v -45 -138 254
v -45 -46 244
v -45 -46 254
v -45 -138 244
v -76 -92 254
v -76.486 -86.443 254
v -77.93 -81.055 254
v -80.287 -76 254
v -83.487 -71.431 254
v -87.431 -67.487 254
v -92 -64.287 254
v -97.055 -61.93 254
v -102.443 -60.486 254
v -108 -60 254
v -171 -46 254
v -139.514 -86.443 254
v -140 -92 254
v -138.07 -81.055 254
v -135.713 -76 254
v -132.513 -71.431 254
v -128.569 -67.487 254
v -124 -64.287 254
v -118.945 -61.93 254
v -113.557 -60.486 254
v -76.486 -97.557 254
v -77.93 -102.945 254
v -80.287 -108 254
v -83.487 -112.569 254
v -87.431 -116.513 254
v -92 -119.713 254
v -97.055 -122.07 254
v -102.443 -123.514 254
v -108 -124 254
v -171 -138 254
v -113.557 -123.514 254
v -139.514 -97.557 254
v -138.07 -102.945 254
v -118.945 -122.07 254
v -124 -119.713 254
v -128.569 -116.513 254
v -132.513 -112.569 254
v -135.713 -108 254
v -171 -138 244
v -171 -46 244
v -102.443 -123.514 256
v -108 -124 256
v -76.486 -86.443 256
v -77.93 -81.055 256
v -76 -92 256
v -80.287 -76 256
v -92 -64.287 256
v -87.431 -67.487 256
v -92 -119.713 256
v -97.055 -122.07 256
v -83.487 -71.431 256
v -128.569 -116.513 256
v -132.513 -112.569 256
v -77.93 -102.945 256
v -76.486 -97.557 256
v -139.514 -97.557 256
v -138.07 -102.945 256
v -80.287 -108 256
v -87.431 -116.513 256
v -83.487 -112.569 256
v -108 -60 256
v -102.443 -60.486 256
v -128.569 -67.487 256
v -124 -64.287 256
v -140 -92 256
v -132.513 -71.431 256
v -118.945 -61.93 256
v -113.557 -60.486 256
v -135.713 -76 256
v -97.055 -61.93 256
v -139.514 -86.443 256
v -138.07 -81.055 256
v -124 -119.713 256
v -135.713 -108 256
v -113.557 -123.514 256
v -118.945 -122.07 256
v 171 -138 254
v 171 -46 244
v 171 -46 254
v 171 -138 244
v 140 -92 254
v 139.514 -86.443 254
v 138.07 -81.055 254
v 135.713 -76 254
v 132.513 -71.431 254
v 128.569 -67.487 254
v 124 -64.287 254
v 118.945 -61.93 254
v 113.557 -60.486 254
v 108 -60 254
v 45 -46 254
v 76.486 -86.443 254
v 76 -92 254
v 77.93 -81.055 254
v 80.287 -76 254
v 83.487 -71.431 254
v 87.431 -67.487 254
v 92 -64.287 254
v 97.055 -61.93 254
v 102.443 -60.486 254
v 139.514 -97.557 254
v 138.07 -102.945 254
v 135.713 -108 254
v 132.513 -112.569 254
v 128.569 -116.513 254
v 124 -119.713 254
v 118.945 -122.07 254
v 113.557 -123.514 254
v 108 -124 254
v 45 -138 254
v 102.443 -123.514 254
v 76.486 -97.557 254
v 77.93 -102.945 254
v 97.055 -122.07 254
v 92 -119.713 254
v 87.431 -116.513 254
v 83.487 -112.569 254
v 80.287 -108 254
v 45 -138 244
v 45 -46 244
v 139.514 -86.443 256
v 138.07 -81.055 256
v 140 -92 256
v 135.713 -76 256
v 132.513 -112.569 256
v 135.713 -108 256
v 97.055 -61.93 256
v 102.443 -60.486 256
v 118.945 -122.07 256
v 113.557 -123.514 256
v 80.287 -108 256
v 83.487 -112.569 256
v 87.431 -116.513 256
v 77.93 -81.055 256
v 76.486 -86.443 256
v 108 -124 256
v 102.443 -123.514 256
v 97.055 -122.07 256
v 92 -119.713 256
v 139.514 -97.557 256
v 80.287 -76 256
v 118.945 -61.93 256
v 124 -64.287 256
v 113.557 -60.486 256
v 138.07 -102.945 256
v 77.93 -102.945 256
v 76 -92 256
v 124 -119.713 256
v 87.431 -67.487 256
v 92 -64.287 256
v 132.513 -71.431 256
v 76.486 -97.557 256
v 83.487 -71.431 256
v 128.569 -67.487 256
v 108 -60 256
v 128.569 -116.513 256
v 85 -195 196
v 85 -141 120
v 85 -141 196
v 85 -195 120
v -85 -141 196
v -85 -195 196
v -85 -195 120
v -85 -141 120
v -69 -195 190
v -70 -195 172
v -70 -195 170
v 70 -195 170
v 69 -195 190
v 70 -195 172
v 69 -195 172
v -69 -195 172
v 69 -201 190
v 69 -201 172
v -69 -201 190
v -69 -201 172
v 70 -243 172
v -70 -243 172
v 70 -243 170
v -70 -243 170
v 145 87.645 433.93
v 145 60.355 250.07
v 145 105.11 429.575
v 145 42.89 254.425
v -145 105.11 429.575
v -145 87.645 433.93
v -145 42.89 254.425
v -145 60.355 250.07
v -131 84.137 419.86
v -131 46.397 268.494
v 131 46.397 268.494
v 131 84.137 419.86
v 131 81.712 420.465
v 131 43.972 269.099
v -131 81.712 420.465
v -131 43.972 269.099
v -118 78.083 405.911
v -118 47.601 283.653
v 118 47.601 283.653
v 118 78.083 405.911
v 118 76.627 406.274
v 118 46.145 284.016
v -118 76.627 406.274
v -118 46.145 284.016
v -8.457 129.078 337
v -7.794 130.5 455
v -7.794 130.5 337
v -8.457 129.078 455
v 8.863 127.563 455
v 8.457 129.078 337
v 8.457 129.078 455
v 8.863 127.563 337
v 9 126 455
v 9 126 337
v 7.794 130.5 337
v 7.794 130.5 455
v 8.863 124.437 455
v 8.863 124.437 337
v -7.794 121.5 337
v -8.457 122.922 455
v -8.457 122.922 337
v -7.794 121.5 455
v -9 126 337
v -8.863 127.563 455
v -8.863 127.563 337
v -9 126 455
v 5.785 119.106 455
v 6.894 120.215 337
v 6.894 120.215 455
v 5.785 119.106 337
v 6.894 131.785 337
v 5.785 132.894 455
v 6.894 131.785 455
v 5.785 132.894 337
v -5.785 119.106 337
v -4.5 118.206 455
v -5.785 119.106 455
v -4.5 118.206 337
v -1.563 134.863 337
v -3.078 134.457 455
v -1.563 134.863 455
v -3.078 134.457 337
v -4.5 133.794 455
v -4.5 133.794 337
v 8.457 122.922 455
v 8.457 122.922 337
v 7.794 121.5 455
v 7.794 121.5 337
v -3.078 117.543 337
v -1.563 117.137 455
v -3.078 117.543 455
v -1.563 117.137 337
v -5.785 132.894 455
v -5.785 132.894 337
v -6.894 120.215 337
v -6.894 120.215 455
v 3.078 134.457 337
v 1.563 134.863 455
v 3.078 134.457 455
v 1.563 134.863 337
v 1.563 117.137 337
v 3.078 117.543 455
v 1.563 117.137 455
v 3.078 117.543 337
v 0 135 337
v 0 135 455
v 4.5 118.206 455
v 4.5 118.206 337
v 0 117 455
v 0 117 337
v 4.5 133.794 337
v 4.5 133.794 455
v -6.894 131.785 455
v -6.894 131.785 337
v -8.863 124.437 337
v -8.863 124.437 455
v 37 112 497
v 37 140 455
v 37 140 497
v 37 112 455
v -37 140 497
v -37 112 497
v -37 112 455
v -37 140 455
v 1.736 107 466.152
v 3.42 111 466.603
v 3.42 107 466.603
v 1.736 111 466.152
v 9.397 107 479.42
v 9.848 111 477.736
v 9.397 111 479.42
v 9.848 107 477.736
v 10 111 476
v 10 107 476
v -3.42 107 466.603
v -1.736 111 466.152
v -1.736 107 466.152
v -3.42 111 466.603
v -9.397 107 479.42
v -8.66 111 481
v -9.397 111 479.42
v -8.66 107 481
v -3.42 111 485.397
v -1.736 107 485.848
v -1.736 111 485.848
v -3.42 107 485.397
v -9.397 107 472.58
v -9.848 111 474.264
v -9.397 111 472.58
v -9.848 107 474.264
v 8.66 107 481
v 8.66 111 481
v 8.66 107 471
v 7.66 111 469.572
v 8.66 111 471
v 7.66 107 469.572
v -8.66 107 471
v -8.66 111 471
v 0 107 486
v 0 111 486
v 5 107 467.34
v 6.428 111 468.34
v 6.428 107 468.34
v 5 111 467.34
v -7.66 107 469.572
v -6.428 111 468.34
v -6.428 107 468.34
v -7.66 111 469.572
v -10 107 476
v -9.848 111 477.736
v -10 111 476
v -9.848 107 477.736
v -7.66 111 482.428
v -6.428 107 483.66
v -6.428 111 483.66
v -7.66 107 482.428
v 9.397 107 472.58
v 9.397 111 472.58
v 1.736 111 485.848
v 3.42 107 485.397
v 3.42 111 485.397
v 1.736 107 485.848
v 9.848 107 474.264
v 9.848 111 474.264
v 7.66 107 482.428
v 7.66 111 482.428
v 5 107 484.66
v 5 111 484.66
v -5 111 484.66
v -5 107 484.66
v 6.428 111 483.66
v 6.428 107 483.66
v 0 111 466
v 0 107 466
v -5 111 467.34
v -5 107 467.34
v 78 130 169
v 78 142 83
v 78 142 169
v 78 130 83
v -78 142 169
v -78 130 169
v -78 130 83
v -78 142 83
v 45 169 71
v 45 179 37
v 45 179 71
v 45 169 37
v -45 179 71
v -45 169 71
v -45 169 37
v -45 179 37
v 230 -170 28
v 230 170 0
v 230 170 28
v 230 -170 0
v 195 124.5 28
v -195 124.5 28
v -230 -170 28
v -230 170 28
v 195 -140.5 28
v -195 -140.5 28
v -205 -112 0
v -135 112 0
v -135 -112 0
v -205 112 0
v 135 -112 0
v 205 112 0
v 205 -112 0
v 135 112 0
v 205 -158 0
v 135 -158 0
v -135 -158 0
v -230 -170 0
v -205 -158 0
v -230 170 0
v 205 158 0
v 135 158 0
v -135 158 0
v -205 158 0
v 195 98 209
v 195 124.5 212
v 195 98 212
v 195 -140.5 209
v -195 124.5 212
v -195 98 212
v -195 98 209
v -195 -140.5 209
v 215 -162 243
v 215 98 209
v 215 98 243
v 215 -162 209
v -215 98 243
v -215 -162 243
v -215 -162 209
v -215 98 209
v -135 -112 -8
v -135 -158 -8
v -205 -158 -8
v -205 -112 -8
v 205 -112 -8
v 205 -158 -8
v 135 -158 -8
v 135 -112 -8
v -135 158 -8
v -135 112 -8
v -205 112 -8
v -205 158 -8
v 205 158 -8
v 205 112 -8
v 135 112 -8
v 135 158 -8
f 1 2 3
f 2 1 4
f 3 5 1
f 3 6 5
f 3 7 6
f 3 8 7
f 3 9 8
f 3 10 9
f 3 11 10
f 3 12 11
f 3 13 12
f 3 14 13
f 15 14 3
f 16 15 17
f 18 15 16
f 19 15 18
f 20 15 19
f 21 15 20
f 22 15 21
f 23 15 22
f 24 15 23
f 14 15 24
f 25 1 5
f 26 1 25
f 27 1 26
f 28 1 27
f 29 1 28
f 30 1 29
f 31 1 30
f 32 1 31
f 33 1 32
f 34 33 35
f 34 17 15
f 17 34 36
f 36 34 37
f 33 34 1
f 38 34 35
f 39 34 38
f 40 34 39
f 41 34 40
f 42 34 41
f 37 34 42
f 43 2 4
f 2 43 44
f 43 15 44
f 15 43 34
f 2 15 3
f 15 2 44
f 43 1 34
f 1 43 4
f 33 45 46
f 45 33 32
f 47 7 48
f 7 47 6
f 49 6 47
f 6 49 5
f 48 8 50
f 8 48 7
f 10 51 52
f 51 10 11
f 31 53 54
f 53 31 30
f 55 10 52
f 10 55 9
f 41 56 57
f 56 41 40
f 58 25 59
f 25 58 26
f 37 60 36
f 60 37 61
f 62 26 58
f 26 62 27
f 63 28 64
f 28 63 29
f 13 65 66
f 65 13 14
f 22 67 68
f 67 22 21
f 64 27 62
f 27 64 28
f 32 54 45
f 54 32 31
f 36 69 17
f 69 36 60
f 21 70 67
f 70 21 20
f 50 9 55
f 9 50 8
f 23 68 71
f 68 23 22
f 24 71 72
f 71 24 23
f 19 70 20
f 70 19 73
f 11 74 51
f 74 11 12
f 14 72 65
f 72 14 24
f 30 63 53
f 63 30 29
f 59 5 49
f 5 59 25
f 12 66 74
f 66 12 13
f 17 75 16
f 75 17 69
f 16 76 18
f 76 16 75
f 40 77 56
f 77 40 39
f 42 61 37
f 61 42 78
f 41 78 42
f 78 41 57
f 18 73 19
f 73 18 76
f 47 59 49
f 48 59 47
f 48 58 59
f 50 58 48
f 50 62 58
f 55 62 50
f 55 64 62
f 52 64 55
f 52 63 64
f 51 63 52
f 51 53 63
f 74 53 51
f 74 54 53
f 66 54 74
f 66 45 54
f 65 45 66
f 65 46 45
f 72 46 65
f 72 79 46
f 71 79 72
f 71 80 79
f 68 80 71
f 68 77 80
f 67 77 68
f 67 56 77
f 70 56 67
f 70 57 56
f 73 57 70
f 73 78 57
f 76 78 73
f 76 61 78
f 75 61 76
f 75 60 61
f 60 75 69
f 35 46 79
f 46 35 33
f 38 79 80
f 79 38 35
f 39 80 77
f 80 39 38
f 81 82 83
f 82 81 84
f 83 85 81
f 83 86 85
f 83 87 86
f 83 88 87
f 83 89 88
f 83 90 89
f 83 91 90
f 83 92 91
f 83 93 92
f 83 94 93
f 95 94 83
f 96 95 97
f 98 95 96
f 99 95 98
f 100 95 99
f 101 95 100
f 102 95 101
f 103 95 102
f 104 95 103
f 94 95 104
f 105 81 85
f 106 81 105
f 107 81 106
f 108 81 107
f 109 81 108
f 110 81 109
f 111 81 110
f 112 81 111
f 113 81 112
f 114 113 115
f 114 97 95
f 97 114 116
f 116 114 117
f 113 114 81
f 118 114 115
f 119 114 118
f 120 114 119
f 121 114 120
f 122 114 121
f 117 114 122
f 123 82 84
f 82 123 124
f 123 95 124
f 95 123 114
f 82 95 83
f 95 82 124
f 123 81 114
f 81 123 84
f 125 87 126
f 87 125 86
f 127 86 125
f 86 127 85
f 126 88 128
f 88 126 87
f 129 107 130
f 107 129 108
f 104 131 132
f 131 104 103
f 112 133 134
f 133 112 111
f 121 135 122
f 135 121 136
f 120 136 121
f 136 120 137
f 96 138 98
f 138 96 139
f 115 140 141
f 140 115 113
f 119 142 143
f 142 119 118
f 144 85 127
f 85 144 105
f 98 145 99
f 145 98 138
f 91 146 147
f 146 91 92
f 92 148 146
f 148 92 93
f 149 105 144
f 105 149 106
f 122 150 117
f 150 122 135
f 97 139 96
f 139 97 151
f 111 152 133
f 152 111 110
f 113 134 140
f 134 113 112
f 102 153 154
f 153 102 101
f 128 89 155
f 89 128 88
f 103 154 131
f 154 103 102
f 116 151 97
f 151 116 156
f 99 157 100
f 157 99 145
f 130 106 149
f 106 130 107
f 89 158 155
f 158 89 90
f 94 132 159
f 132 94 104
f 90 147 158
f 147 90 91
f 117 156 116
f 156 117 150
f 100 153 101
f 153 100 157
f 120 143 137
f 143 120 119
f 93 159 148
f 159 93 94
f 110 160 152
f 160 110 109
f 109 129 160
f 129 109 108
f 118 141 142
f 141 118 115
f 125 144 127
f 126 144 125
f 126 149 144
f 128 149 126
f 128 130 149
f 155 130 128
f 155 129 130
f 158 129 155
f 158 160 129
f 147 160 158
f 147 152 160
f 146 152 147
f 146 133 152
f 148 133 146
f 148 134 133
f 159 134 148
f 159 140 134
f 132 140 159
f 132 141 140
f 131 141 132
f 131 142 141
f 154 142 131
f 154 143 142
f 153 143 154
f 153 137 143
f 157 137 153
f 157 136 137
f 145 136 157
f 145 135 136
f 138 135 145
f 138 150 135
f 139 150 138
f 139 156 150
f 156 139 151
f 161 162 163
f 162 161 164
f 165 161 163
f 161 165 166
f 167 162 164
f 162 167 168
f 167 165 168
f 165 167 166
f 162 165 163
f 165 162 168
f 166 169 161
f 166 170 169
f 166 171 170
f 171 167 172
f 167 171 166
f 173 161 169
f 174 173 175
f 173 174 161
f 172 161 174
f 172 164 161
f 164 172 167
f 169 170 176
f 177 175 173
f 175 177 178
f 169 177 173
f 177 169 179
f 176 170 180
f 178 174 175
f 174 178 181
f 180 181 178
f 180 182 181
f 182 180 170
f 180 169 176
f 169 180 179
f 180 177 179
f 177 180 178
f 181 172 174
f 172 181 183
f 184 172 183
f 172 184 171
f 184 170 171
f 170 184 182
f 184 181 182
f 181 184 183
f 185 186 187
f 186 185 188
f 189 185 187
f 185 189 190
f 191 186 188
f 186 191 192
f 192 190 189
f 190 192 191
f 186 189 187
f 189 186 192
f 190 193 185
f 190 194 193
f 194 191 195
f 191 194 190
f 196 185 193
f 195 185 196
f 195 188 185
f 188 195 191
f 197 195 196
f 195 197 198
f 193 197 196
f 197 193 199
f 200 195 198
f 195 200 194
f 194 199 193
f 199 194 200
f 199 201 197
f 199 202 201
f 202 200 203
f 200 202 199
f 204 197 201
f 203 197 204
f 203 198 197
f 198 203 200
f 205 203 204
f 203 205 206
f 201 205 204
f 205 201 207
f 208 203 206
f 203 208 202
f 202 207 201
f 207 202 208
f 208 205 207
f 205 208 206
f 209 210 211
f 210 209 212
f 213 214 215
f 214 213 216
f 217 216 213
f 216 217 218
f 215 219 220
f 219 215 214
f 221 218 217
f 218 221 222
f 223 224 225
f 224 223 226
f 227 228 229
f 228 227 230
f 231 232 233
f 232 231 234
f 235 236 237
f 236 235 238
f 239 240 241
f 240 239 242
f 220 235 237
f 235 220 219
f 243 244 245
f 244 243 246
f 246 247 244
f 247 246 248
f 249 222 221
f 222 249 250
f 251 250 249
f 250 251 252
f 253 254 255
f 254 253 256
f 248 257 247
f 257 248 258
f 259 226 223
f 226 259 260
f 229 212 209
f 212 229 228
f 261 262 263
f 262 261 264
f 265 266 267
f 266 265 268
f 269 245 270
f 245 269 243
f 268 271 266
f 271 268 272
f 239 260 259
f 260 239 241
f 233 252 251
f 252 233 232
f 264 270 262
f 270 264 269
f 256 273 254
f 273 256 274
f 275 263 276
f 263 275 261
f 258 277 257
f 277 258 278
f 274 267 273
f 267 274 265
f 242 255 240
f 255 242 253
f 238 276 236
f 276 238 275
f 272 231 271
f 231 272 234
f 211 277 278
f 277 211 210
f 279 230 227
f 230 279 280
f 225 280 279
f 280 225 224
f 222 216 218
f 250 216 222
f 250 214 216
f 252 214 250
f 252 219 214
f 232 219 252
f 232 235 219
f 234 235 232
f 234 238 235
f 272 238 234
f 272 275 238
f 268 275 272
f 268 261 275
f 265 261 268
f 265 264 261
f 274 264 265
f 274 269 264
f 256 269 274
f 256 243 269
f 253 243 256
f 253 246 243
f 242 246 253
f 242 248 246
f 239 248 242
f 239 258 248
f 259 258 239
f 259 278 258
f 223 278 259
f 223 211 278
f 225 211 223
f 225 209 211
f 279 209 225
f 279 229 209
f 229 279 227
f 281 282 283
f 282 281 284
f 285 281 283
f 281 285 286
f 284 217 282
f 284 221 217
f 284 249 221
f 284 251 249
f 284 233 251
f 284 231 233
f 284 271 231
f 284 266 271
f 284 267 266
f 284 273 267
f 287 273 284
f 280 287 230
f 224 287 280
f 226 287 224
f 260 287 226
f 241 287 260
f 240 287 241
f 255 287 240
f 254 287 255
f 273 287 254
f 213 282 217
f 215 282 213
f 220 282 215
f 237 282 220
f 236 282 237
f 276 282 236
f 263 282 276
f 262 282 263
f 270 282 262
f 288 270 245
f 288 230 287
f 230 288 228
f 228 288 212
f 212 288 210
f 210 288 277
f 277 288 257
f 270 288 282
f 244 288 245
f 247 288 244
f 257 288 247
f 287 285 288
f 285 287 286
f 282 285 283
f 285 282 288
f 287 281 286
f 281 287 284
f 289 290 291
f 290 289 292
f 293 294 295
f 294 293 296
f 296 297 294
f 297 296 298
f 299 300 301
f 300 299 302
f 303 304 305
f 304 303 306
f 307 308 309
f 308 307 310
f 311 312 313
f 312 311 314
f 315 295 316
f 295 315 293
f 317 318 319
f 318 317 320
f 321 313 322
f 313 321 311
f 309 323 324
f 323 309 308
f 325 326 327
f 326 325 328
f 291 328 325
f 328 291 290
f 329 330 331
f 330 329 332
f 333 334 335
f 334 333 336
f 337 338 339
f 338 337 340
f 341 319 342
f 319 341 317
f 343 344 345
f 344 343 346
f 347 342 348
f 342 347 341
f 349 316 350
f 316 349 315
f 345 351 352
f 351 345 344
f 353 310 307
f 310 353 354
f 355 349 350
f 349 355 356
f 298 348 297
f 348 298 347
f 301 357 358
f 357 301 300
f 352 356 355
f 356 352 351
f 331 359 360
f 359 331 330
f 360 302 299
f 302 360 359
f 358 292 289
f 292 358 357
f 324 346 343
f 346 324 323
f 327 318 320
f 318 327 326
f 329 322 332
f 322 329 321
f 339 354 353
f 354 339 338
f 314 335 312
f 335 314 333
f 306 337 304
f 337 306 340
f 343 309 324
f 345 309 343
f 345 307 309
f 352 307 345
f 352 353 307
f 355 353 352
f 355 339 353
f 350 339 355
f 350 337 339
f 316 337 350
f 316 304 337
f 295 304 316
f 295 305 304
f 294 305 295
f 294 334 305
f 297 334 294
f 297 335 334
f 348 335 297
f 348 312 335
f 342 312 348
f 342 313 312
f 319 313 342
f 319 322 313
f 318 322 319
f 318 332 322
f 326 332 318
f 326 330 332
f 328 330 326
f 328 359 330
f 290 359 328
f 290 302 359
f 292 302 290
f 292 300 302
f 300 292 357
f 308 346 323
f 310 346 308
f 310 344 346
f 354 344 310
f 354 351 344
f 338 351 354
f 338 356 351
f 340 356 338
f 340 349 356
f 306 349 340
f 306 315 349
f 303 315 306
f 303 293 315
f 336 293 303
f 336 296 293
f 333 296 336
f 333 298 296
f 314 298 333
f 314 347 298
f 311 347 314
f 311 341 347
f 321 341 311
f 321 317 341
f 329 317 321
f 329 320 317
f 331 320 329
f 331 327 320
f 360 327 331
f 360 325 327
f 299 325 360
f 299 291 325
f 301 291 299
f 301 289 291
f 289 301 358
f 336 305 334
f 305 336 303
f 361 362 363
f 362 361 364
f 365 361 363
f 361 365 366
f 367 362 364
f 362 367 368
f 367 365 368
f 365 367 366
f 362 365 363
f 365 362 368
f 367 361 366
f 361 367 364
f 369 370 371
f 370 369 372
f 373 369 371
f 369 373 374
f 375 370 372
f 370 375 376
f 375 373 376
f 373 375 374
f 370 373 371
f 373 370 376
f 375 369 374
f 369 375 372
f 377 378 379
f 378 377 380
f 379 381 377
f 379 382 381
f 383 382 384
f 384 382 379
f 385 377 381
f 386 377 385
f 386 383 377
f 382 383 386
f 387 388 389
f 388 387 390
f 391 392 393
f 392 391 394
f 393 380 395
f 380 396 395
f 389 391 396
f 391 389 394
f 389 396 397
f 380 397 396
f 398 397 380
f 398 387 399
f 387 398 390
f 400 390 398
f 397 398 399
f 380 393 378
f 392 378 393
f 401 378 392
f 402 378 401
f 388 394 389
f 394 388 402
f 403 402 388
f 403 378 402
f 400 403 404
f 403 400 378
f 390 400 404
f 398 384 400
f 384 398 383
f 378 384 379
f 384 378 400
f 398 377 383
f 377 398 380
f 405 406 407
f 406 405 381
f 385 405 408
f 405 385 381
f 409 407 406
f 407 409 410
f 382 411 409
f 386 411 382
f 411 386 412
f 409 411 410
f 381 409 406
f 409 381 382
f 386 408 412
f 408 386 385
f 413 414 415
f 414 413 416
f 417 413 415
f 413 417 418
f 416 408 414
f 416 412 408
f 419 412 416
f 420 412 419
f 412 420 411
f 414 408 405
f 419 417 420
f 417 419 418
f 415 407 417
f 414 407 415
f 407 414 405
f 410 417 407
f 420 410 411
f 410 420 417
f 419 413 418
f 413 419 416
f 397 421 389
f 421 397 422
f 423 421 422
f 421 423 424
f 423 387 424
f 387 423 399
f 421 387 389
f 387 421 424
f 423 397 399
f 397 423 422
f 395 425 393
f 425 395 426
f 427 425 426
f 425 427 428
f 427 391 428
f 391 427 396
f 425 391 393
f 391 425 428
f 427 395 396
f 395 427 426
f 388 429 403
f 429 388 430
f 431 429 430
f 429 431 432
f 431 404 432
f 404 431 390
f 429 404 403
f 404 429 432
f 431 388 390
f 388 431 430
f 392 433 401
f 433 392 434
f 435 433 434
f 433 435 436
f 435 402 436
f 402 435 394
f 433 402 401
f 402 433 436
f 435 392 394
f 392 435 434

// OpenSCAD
// ReliefCheck kiosk v1 concept model
// Unit: millimeter
// This is a first layout model for demo and review, not a fabrication-ready CAD file.

$fn = 36;

module part_box(name, pos, size, color_value) {
  color(color_value)
    translate(pos)
      cube(size, center = true);
}

module label_plate(pos, size, color_value) {
  color(color_value)
    translate(pos)
      cube(size, center = true);
}

module touch_display() {
  translate([0, 74, 342])
    rotate([-14, 0, 0]) {
      part_box("screen_frame", [0, 0, 0], [290, 18, 185], "#1f2933");
      part_box("screen_glass", [0, -10, 0], [262, 3, 156], "#111827");
      label_plate([0, -12, 0], [236, 2, 126], "#1769e0");
    }
}

module camera_module() {
  color("#2f3945")
    translate([0, 126, 402])
      cylinder(h = 130, r = 9, center = true);
  part_box("camera_head", [0, 126, 476], [74, 28, 42], "#1f2933");
  color("#0f172a")
    translate([0, 109, 476])
      rotate([90, 0, 0])
        cylinder(h = 4, r = 10, center = true);
}

module nfc_pad(x_pos, color_value) {
  part_box("nfc_pad", [x_pos, -92, 249], [126, 92, 10], color_value);
  color("#ffffff")
    translate([x_pos, -92, 255])
      cylinder(h = 2, r = 32, center = true);
}

module printer_module() {
  part_box("printer_module", [0, -168, 158], [170, 54, 76], "#374151");
  part_box("paper_slot", [0, -197, 181], [138, 8, 18], "#111827");
  part_box("receipt_paper", [0, -210, 171], [140, 66, 2], "#f8fafc");
}

module pi_service_bay() {
  part_box("pi_service_cover", [0, 136, 126], [156, 12, 86], "#4b5563");
  part_box("cable_exit", [0, 174, 54], [90, 10, 34], "#111827");
}

module reliefcheck_kiosk_v1() {
  part_box("base_plinth", [0, 0, 14], [460, 340, 28], "#d8dee4");
  part_box("main_body", [0, -8, 120], [390, 265, 184], "#f8fafc");
  part_box("touch_console", [0, -32, 226], [430, 260, 34], "#e5e7eb");

  nfc_pad(-108, "#1769e0");
  nfc_pad(108, "#147447");
  printer_module();
  touch_display();
  camera_module();
  pi_service_bay();

  // Foot pads
  part_box("foot_left_front", [-170, -135, -4], [70, 46, 8], "#9ca3af");
  part_box("foot_right_front", [170, -135, -4], [70, 46, 8], "#9ca3af");
  part_box("foot_left_back", [-170, 135, -4], [70, 46, 8], "#9ca3af");
  part_box("foot_right_back", [170, 135, -4], [70, 46, 8], "#9ca3af");
}

reliefcheck_kiosk_v1();
